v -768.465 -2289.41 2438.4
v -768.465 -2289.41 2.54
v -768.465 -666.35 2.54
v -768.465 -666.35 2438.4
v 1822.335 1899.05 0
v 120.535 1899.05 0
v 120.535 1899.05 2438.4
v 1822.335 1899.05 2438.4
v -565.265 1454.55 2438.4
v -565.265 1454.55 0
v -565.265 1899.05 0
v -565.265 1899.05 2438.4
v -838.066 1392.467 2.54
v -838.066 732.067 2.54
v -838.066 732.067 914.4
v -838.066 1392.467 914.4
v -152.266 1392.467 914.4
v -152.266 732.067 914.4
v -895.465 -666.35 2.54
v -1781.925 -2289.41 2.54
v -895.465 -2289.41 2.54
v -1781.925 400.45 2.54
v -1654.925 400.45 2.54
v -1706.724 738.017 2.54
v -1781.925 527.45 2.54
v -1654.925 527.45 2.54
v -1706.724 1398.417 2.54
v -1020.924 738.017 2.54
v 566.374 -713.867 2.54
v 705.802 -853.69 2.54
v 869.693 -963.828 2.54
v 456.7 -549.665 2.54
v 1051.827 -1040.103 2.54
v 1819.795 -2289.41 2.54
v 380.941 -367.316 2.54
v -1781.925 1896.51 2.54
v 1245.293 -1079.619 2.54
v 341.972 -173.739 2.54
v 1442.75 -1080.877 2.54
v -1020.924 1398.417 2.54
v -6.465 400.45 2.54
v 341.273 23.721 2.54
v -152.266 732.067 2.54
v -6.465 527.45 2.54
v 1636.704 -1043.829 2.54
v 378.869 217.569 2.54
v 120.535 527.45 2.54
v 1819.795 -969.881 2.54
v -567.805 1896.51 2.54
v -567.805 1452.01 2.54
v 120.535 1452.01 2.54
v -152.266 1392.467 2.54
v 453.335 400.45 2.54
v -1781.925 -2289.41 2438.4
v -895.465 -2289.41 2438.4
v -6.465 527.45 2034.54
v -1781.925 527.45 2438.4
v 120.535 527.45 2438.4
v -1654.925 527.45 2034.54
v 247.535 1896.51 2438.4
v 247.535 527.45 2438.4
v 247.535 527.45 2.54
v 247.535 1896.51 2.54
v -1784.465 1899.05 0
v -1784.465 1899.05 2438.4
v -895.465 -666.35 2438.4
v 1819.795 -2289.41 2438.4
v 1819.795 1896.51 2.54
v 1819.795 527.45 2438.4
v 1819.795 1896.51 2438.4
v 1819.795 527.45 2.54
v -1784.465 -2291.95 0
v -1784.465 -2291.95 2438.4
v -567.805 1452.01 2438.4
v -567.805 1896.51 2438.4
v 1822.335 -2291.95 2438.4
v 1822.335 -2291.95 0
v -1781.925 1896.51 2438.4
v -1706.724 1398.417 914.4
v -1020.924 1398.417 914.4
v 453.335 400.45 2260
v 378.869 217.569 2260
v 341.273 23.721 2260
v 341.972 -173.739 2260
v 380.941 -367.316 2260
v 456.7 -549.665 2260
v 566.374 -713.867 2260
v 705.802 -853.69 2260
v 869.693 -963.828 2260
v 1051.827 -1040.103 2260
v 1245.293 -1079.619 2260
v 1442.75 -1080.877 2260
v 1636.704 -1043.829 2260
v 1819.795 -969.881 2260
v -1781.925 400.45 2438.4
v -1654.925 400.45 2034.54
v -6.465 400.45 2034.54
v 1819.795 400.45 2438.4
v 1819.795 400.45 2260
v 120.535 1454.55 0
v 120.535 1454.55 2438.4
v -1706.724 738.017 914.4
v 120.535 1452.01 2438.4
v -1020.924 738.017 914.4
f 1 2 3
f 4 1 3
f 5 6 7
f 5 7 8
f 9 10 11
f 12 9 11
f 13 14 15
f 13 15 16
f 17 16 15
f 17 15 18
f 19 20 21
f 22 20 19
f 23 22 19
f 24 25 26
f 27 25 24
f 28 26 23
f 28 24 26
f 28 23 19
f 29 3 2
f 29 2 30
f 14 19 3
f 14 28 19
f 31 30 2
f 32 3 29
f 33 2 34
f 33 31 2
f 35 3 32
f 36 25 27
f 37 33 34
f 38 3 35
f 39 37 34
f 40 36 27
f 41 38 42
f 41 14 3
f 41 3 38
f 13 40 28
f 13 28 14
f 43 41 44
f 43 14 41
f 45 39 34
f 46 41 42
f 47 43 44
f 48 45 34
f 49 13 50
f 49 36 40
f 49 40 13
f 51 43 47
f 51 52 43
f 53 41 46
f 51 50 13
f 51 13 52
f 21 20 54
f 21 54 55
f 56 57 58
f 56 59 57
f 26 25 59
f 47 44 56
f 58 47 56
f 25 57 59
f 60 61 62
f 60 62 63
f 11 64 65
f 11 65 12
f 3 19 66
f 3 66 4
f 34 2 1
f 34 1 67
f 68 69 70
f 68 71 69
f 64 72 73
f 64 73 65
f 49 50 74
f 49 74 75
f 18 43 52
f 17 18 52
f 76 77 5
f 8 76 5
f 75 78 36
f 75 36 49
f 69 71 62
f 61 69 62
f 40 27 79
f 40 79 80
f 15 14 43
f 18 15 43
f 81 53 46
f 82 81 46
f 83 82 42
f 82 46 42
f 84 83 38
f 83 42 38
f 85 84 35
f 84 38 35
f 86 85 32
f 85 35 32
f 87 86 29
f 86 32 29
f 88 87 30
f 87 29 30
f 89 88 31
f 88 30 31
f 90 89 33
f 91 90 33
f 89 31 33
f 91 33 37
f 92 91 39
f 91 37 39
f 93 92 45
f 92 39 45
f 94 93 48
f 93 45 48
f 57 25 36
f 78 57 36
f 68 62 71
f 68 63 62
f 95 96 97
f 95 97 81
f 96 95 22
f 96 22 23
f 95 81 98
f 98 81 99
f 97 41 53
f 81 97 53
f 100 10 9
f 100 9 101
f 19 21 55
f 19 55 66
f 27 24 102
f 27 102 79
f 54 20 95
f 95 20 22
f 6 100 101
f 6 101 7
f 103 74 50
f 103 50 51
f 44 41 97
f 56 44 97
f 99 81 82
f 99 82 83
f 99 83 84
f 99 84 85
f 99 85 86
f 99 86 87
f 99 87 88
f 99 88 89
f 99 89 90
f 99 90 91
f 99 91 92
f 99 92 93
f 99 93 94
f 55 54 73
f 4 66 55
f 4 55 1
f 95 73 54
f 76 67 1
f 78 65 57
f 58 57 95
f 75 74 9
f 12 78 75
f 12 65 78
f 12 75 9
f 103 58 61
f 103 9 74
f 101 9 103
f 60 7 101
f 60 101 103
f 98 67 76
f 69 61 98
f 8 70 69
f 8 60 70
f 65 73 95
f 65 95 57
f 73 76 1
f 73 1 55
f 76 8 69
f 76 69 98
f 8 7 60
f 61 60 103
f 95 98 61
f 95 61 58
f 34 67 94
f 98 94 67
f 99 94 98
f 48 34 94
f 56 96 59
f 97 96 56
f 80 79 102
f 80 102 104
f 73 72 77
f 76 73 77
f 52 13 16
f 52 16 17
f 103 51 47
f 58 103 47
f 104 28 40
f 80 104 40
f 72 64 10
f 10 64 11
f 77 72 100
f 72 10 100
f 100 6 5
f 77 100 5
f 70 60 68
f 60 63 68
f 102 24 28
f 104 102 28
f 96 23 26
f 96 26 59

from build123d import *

# Parameters (mm, degrees)
F0_W      = 3606.8
F0_H      = 4191
F3_DEPTH  = 2438.4
F1_W      = 685.8
F1_H      = 444.5
F4_DEPTH  = 2438.4
F5_T      = -2.54
F6_DEPTH  = 2260
F7_W      = 127
F7_H      = 1625.6
F8_DEPTH  = 2438.4
F9_W      = 685.8
F9_H      = 660.4
F10_DEPTH = 914.4
F11_W     = 127
F11_H     = 1371.6
F11_W_2   = 1902.46
F11_H_2   = 127
F12_DEPTH = 2438.4
F13_W     = 1648.46
F13_H     = 2032
F14_DEPTH = 127


with BuildPart() as f3:
    # F0 (on Top) → F3 (new body)
    with BuildSketch(Plane.XY):
        with Locations((18.9348682761, -196.4497311732)):
            Rectangle(F0_W, F0_H)
    extrude(amount=F3_DEPTH)

    # F1 (on Top) → F4 (cut)
    with BuildSketch(Plane.XY):
        with Locations((-222.3651317239, 1676.8002688268)):
            Rectangle(F1_W, F1_H)
    extrude(amount=F4_DEPTH, mode=Mode.SUBTRACT)

    # F5
    f5_openings = [f3.faces().sort_by_distance(p)[0] for p in [
        (23.901186, -235.004043, 2438.4),
    ]]
    offset(amount=F5_T, openings=f5_openings, kind=Kind.INTERSECTION)

    # F2 (on Top) → F6 (join)
    with BuildSketch(Plane.XY):
        with BuildLine():
            Line((1822.3348682761, -968.5497311732), (1822.3348682761, 400.4502688268))
            Line((1822.3348682761, 400.4502688268), (453.3348682761, 400.4502688268))
            ThreePointArc((453.3348682761, 400.4502688268), (633.6883691015, -788.1962303477), (1822.3348682761, -968.5497311732))
        make_face()
    extrude(amount=F6_DEPTH)

    # F7 (on Top) → F8 (join)
    with BuildSketch(Plane.XY):
        with Locations((-831.9651317239, -1479.1497311732)):
            Rectangle(F7_W, F7_H)
    extrude(amount=F8_DEPTH)

    # F9 (on Top) → F10 (join)
    with BuildSketch(Plane.XY):
        with Locations((-1363.8244271278, 1068.2173974498)):
            Rectangle(F9_W, F9_H)
        with Locations((-495.1655566692, 1062.2670650482)):
            Rectangle(F9_W, F9_H)
    extrude(amount=F10_DEPTH)

    # F11 (on Top) → F12 (join)
    with BuildSketch(Plane.XY):
        with Locations((184.0348682761, 1213.2502688268)):
            Rectangle(F11_W, F11_H)
        Polygon((247.5348682761, 527.4502688268), (120.5348682761, 527.4502688268), (120.5348682761, 400.4502688268), (1822.3348682761, 400.4502688268), (1822.3348682761, 527.4502688268), align=None)
        with Locations((-830.6951317239, 463.9502688268)):
            Rectangle(F11_W_2, F11_H_2)
    extrude(amount=F12_DEPTH)

    # F13 (on face) → F14 (cut)
    with BuildSketch(Plane.XZ.offset(-400.4502688268)):
        with Locations((-830.6951317239, 1018.54)):
            Rectangle(F13_W, F13_H)
    extrude(amount=-F14_DEPTH, mode=Mode.SUBTRACT)


solid = f3.part
